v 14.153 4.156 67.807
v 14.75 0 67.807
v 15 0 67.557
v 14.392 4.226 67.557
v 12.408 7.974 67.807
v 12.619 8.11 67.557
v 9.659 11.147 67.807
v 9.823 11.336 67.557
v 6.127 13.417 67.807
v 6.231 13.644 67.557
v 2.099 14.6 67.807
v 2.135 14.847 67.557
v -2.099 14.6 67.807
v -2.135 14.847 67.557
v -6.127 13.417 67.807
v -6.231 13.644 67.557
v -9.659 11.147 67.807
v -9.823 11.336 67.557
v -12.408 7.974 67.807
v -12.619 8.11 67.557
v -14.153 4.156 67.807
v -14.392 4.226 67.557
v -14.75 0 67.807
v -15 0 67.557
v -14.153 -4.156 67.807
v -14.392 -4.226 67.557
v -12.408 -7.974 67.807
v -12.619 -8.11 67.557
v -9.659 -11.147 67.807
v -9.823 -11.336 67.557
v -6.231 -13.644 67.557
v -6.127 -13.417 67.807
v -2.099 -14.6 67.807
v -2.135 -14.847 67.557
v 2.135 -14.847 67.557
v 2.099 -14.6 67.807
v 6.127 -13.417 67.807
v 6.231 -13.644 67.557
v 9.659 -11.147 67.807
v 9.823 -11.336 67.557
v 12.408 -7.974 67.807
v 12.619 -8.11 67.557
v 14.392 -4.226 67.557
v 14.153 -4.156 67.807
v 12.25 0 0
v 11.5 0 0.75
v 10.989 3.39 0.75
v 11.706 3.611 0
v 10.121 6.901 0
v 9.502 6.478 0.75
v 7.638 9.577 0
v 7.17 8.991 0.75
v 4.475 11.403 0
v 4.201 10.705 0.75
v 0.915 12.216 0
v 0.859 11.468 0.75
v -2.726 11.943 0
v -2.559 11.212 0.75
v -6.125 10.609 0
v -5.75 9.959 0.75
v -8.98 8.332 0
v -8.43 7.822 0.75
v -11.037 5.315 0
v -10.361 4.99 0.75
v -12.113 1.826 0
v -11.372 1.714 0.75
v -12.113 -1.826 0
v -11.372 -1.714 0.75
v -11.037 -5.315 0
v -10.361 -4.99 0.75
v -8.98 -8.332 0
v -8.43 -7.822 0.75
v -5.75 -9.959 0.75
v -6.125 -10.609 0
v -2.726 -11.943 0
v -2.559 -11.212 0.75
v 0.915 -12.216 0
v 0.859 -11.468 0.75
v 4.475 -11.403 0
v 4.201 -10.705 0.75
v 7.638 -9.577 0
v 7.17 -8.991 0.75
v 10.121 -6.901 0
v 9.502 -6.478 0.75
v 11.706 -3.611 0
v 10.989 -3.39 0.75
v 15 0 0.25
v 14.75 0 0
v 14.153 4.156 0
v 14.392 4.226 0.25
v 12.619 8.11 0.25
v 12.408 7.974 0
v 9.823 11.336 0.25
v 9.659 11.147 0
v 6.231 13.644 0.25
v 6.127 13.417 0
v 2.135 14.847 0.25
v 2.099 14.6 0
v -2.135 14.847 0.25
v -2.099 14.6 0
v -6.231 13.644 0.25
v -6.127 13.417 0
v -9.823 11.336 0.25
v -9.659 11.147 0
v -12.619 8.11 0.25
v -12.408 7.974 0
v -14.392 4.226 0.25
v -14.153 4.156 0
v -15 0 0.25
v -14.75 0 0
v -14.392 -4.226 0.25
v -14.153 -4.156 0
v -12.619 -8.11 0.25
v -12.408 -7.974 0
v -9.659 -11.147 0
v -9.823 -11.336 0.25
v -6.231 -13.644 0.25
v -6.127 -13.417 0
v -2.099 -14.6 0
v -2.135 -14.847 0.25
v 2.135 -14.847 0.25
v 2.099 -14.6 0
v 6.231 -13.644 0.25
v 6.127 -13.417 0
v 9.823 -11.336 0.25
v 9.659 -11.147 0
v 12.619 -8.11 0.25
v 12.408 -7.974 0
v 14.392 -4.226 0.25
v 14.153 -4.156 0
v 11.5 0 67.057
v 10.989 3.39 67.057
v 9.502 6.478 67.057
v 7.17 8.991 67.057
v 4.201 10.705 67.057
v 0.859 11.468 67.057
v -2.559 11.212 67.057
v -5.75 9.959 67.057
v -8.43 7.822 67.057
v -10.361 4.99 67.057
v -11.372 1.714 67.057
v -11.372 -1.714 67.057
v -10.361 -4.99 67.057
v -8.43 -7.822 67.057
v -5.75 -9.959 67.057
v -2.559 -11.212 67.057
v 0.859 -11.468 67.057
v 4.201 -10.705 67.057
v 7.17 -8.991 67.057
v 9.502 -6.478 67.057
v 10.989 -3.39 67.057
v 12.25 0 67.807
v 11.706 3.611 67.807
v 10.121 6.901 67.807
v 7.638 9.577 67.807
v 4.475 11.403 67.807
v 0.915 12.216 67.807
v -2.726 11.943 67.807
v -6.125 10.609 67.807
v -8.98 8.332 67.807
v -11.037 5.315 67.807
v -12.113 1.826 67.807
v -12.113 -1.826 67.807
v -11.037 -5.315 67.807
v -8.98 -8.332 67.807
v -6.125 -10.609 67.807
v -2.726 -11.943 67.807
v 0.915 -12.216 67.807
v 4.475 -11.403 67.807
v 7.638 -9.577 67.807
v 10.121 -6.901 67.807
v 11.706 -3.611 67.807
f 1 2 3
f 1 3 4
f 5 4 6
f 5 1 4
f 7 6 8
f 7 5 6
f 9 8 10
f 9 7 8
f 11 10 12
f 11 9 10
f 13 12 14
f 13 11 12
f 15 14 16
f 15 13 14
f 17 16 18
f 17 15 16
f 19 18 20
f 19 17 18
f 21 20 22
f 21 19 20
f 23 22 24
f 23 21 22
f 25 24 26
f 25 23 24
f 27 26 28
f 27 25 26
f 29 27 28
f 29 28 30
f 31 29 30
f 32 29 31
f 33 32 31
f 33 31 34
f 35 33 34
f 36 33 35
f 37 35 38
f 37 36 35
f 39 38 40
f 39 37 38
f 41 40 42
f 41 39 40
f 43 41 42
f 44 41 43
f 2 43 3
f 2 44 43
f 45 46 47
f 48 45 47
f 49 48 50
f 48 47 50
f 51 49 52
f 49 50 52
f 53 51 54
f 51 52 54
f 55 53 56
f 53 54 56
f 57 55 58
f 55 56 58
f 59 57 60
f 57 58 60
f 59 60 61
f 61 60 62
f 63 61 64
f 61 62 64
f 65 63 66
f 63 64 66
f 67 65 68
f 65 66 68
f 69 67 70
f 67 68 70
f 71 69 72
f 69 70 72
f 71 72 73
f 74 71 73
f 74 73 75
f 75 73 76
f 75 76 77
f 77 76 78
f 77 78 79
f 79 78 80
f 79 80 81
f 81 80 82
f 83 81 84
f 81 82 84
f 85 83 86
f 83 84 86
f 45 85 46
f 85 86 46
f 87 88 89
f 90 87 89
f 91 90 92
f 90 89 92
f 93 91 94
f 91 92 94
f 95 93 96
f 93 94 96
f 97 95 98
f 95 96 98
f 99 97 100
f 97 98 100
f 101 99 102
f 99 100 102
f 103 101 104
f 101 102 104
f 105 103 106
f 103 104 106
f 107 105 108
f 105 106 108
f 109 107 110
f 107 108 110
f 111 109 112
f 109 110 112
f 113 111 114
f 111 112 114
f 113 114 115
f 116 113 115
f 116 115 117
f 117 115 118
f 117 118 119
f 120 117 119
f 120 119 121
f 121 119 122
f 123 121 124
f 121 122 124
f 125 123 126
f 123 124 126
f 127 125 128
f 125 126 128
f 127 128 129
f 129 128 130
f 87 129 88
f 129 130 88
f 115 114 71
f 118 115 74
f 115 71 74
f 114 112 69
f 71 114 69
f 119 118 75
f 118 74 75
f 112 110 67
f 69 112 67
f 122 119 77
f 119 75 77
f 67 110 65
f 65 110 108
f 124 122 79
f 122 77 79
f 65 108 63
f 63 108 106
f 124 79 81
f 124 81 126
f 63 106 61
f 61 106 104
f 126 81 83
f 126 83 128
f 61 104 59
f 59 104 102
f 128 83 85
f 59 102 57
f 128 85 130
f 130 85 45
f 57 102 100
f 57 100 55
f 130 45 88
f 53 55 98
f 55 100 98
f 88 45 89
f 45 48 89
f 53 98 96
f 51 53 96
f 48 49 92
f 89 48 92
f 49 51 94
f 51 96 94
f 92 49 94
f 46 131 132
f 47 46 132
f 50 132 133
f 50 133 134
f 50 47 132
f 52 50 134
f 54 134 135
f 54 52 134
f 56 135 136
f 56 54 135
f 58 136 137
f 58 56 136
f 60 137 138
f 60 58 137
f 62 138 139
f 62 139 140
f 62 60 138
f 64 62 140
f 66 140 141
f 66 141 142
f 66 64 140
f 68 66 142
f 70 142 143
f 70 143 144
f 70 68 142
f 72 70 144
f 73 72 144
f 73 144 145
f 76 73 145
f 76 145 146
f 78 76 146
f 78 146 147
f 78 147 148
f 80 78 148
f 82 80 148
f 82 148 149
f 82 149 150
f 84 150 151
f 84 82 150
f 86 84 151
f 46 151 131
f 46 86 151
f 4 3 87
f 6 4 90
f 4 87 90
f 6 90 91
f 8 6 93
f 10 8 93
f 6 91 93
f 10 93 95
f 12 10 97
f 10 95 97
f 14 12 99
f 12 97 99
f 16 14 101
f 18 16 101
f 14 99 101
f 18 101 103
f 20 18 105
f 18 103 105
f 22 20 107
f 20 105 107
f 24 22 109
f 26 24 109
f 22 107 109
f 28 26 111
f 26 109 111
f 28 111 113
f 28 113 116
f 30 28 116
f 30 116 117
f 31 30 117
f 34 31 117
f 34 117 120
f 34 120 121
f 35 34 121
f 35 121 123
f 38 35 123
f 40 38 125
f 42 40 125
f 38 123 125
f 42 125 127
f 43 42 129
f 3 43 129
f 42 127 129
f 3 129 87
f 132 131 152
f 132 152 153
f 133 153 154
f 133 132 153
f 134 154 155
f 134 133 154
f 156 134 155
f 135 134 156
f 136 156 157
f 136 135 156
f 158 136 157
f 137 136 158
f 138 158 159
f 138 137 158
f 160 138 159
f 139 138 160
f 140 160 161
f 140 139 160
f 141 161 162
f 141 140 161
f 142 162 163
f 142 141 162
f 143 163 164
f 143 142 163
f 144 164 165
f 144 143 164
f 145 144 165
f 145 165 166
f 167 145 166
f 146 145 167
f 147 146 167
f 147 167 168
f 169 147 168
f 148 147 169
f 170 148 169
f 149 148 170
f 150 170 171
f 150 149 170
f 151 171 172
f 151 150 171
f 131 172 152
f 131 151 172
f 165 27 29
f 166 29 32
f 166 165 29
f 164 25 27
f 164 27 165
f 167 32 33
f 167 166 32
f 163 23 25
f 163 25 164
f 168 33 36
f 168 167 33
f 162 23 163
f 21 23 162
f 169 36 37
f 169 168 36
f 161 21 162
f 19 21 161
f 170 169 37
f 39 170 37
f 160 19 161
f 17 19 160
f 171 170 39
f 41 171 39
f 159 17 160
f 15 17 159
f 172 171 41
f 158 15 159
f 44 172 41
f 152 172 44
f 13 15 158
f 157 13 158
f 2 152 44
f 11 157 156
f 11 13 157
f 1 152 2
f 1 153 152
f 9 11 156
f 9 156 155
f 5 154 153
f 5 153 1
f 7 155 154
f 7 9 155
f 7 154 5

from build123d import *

# Parameters (mm, degrees)
SKETCH1_R           = 15
SKETCH1_R_2         = 11.5
BOSS_EXTRUDE1_DEPTH = 67.8072
CHAMFER1_SIZE       = 0.25
CHAMFER2_SIZE       = 0.75


with BuildPart() as part:
    # Sketch1 → Boss-Extrude1 (new body)
    with BuildSketch(Plane.XY):
        Circle(SKETCH1_R)
        Circle(SKETCH1_R_2, mode=Mode.SUBTRACT)
    extrude(amount=BOSS_EXTRUDE1_DEPTH)

    # Chamfer1
    chamfer1_edges = [part.edges().sort_by_distance(p)[0] for p in [
        (-15, 0, 0),
        (-15, 0, 67.8072),
    ]]
    chamfer(chamfer1_edges, length=CHAMFER1_SIZE)

    # Chamfer2
    chamfer2_edges = [part.edges().sort_by_distance(p)[0] for p in [
        (-11.5, 0, 0),
        (-11.5, 0, 67.8072),
    ]]
    chamfer(chamfer2_edges, length=CHAMFER2_SIZE)


solid = part.part
